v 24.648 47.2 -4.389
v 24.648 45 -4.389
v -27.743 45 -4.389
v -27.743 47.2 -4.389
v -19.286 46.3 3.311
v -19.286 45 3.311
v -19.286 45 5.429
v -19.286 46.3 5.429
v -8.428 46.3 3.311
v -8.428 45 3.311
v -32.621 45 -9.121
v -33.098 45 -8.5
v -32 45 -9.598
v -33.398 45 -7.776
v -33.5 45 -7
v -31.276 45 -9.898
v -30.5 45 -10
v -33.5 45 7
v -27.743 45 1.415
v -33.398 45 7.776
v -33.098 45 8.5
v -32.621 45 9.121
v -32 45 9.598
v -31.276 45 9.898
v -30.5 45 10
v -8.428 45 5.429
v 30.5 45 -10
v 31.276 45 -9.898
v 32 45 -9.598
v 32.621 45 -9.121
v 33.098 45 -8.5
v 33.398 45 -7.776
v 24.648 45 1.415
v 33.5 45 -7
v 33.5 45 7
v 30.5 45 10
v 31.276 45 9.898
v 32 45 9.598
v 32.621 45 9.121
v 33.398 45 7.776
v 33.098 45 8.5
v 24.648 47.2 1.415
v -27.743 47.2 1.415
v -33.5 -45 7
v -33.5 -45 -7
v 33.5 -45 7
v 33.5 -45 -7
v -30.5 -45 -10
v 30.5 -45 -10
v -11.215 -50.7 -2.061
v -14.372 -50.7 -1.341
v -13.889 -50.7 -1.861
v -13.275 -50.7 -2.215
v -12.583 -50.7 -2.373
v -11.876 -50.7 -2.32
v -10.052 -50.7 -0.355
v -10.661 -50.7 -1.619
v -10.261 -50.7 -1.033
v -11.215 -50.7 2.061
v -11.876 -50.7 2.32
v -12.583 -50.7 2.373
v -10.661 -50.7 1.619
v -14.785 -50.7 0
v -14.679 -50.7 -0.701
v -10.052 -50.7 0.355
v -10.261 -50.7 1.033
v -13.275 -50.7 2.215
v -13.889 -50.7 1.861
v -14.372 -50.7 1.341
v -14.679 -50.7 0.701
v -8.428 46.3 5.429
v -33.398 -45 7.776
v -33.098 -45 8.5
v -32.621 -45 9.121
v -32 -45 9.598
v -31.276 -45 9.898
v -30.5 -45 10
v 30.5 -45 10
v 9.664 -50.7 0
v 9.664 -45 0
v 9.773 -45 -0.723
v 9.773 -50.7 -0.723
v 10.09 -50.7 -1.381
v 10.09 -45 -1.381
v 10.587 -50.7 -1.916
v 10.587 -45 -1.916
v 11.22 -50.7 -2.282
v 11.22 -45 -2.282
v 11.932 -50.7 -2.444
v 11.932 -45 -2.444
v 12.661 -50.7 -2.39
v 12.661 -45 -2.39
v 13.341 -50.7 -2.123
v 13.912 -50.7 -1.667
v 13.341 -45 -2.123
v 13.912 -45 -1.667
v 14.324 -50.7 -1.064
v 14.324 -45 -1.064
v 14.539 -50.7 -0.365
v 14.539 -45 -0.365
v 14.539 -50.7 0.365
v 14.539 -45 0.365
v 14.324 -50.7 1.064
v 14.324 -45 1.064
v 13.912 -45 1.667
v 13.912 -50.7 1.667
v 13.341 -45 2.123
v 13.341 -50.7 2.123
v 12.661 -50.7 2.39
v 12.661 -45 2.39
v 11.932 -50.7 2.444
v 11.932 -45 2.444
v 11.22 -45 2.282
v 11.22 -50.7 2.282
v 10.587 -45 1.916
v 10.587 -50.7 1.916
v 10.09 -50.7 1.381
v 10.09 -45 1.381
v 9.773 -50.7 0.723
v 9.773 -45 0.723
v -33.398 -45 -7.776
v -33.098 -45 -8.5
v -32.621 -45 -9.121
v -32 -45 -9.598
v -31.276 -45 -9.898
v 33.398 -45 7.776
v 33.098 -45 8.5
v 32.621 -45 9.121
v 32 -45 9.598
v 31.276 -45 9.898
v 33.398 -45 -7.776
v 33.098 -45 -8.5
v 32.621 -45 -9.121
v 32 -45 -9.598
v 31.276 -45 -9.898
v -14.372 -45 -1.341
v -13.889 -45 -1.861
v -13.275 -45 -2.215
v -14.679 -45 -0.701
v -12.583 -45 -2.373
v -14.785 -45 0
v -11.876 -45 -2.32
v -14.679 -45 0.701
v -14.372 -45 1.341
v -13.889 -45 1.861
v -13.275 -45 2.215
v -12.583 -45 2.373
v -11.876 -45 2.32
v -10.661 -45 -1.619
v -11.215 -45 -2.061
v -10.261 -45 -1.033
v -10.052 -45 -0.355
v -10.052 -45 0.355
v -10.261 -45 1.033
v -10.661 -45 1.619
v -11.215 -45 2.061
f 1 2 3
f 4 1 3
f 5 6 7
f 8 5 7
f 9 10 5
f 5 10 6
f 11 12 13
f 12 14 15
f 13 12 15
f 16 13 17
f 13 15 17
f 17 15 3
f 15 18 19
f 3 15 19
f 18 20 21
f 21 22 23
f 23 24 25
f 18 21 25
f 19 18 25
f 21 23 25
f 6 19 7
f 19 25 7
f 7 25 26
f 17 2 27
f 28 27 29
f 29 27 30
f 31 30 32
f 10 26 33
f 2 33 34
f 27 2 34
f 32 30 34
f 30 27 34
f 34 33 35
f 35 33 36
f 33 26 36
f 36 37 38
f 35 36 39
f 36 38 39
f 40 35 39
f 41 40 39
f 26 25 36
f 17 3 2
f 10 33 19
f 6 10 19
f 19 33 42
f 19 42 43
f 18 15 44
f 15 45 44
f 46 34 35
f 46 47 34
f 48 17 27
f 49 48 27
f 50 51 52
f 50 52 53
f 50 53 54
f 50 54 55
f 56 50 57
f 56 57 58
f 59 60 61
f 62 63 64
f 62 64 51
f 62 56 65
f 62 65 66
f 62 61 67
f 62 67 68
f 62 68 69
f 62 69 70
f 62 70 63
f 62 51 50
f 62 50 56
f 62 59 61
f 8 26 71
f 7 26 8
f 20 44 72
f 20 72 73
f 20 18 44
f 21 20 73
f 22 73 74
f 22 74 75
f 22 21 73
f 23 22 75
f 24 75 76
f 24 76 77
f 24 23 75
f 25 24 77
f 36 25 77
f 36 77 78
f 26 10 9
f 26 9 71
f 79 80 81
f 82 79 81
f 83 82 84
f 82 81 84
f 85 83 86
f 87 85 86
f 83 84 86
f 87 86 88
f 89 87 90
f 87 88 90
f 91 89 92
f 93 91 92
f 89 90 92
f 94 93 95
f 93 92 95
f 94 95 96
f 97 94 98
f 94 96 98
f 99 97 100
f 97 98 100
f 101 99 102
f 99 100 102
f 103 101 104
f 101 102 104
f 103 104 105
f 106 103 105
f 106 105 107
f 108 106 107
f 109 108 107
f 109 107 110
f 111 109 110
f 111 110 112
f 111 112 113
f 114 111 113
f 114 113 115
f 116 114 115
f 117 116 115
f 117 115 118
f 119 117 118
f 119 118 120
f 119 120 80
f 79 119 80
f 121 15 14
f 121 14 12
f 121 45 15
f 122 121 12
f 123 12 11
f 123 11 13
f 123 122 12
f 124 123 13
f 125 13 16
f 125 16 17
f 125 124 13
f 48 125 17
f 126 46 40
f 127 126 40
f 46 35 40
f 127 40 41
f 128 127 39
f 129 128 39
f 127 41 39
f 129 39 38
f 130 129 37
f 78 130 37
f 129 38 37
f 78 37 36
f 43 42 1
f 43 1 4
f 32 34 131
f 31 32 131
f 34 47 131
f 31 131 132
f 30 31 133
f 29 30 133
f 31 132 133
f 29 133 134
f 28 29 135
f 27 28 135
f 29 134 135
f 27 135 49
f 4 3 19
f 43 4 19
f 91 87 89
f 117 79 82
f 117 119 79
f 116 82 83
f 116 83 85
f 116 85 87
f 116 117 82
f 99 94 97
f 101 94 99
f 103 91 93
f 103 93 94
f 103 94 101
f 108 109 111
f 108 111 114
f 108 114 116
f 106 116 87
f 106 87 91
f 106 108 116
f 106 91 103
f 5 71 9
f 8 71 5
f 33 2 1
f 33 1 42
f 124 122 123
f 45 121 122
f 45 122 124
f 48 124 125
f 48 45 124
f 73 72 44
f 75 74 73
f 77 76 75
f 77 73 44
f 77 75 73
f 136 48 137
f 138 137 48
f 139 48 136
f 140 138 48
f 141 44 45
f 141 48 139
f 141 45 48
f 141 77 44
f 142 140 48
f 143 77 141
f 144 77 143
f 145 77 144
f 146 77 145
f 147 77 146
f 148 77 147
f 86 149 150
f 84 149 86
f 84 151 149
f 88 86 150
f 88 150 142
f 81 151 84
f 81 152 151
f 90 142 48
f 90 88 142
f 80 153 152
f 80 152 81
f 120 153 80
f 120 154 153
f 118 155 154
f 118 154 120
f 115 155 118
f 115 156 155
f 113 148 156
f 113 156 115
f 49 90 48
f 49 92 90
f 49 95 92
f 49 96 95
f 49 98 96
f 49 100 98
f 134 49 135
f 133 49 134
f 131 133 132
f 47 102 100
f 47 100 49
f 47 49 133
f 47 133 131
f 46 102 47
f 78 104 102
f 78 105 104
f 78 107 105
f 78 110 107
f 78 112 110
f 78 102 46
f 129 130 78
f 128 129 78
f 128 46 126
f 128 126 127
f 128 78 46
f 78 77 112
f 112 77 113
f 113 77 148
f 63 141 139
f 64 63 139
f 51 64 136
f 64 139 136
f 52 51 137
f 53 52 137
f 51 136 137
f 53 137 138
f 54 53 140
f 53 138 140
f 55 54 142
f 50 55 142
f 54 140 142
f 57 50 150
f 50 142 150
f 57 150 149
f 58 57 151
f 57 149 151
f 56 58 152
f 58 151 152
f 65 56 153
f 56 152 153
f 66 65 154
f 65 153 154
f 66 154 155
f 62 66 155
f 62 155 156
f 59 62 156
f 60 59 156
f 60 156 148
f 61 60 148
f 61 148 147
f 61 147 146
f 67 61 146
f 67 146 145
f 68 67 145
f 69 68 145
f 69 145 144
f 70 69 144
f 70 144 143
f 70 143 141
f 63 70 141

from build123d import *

# Parameters (mm, degrees)
F0_W     = 67
F0_H     = 20
F1_DEPTH = 45
F2_R     = 3
F4_DEPTH = 5.6
F5_DEPTH = 5.7
F6_W     = 52.390475
F6_H     = 5.804801
F7_DEPTH = 2.2
F6_W_2   = 10.85727
F6_H_2   = 2.118381
F8_DEPTH = 1.3


with BuildPart() as f1:
    # F0 (on Front) → F1 (new body, symmetric)
    with BuildSketch(Plane.XZ):
        Rectangle(F0_W, F0_H)
    extrude(amount=F1_DEPTH, both=True)

    # F2
    f2_edges = [f1.edges().sort_by_distance(p)[0] for p in [
        (-33.5, 0, 10),
        (-33.5, 0, -10),
        (33.5, 0, 10),
        (33.5, 0, -10),
    ]]
    fillet(f2_edges, radius=F2_R)

    # F3 (on face) → F4 (join)
    with BuildSketch(Plane.XZ.offset(45)):
        with BuildLine():
            ThreePointArc((-10.025558, 0), (-12.40529, 2.379732), (-14.785022, 0))
            Line((-14.785022, 0), (-10.025558, 0))
        make_face()
        with BuildLine():
            ThreePointArc((14.566558, 0), (12.115266, 2.451292), (9.663974, 0))
            Line((9.663974, 0), (14.566558, 0))
        make_face()
        with BuildLine():
            Line((14.566558, 0), (9.663974, 0))
            ThreePointArc((9.663974, 0), (12.115266, -2.451292), (14.566558, 0))
        make_face()
        with BuildLine():
            Line((-10.025558, 0), (-14.785022, 0))
            ThreePointArc((-14.785022, 0), (-12.40529, -2.379732), (-10.025558, 0))
        make_face()
    extrude(amount=F4_DEPTH)

    # F3 (on face) → F5 (join)
    with BuildSketch(Plane.XZ.offset(45)):
        with BuildLine():
            ThreePointArc((-10.025558, 0), (-12.40529, 2.379732), (-14.785022, 0))
            Line((-14.785022, 0), (-10.025558, 0))
        make_face()
        with BuildLine():
            ThreePointArc((14.566558, 0), (12.115266, 2.451292), (9.663974, 0))
            Line((9.663974, 0), (14.566558, 0))
        make_face()
        with BuildLine():
            Line((14.566558, 0), (9.663974, 0))
            ThreePointArc((9.663974, 0), (12.115266, -2.451292), (14.566558, 0))
        make_face()
        with BuildLine():
            Line((-10.025558, 0), (-14.785022, 0))
            ThreePointArc((-14.785022, 0), (-12.40529, -2.379732), (-10.025558, 0))
        make_face()
    extrude(amount=F5_DEPTH)

    # F6 (on face) → F7 (join)
    with BuildSketch(Plane(origin=(0, 45, 0), x_dir=(-1, 0, 0), z_dir=(0, 1, 0))):
        with Locations((1.547624, -1.486943)):
            Rectangle(F6_W, F6_H)
    extrude(amount=F7_DEPTH)

    # F6 (on face) → F8 (join)
    with BuildSketch(Plane(origin=(0, 45, 0), x_dir=(-1, 0, 0), z_dir=(0, 1, 0))):
        with Locations((13.856874, 4.369838)):
            Rectangle(F6_W_2, F6_H_2)
    extrude(amount=F8_DEPTH)


solid = f1.part
